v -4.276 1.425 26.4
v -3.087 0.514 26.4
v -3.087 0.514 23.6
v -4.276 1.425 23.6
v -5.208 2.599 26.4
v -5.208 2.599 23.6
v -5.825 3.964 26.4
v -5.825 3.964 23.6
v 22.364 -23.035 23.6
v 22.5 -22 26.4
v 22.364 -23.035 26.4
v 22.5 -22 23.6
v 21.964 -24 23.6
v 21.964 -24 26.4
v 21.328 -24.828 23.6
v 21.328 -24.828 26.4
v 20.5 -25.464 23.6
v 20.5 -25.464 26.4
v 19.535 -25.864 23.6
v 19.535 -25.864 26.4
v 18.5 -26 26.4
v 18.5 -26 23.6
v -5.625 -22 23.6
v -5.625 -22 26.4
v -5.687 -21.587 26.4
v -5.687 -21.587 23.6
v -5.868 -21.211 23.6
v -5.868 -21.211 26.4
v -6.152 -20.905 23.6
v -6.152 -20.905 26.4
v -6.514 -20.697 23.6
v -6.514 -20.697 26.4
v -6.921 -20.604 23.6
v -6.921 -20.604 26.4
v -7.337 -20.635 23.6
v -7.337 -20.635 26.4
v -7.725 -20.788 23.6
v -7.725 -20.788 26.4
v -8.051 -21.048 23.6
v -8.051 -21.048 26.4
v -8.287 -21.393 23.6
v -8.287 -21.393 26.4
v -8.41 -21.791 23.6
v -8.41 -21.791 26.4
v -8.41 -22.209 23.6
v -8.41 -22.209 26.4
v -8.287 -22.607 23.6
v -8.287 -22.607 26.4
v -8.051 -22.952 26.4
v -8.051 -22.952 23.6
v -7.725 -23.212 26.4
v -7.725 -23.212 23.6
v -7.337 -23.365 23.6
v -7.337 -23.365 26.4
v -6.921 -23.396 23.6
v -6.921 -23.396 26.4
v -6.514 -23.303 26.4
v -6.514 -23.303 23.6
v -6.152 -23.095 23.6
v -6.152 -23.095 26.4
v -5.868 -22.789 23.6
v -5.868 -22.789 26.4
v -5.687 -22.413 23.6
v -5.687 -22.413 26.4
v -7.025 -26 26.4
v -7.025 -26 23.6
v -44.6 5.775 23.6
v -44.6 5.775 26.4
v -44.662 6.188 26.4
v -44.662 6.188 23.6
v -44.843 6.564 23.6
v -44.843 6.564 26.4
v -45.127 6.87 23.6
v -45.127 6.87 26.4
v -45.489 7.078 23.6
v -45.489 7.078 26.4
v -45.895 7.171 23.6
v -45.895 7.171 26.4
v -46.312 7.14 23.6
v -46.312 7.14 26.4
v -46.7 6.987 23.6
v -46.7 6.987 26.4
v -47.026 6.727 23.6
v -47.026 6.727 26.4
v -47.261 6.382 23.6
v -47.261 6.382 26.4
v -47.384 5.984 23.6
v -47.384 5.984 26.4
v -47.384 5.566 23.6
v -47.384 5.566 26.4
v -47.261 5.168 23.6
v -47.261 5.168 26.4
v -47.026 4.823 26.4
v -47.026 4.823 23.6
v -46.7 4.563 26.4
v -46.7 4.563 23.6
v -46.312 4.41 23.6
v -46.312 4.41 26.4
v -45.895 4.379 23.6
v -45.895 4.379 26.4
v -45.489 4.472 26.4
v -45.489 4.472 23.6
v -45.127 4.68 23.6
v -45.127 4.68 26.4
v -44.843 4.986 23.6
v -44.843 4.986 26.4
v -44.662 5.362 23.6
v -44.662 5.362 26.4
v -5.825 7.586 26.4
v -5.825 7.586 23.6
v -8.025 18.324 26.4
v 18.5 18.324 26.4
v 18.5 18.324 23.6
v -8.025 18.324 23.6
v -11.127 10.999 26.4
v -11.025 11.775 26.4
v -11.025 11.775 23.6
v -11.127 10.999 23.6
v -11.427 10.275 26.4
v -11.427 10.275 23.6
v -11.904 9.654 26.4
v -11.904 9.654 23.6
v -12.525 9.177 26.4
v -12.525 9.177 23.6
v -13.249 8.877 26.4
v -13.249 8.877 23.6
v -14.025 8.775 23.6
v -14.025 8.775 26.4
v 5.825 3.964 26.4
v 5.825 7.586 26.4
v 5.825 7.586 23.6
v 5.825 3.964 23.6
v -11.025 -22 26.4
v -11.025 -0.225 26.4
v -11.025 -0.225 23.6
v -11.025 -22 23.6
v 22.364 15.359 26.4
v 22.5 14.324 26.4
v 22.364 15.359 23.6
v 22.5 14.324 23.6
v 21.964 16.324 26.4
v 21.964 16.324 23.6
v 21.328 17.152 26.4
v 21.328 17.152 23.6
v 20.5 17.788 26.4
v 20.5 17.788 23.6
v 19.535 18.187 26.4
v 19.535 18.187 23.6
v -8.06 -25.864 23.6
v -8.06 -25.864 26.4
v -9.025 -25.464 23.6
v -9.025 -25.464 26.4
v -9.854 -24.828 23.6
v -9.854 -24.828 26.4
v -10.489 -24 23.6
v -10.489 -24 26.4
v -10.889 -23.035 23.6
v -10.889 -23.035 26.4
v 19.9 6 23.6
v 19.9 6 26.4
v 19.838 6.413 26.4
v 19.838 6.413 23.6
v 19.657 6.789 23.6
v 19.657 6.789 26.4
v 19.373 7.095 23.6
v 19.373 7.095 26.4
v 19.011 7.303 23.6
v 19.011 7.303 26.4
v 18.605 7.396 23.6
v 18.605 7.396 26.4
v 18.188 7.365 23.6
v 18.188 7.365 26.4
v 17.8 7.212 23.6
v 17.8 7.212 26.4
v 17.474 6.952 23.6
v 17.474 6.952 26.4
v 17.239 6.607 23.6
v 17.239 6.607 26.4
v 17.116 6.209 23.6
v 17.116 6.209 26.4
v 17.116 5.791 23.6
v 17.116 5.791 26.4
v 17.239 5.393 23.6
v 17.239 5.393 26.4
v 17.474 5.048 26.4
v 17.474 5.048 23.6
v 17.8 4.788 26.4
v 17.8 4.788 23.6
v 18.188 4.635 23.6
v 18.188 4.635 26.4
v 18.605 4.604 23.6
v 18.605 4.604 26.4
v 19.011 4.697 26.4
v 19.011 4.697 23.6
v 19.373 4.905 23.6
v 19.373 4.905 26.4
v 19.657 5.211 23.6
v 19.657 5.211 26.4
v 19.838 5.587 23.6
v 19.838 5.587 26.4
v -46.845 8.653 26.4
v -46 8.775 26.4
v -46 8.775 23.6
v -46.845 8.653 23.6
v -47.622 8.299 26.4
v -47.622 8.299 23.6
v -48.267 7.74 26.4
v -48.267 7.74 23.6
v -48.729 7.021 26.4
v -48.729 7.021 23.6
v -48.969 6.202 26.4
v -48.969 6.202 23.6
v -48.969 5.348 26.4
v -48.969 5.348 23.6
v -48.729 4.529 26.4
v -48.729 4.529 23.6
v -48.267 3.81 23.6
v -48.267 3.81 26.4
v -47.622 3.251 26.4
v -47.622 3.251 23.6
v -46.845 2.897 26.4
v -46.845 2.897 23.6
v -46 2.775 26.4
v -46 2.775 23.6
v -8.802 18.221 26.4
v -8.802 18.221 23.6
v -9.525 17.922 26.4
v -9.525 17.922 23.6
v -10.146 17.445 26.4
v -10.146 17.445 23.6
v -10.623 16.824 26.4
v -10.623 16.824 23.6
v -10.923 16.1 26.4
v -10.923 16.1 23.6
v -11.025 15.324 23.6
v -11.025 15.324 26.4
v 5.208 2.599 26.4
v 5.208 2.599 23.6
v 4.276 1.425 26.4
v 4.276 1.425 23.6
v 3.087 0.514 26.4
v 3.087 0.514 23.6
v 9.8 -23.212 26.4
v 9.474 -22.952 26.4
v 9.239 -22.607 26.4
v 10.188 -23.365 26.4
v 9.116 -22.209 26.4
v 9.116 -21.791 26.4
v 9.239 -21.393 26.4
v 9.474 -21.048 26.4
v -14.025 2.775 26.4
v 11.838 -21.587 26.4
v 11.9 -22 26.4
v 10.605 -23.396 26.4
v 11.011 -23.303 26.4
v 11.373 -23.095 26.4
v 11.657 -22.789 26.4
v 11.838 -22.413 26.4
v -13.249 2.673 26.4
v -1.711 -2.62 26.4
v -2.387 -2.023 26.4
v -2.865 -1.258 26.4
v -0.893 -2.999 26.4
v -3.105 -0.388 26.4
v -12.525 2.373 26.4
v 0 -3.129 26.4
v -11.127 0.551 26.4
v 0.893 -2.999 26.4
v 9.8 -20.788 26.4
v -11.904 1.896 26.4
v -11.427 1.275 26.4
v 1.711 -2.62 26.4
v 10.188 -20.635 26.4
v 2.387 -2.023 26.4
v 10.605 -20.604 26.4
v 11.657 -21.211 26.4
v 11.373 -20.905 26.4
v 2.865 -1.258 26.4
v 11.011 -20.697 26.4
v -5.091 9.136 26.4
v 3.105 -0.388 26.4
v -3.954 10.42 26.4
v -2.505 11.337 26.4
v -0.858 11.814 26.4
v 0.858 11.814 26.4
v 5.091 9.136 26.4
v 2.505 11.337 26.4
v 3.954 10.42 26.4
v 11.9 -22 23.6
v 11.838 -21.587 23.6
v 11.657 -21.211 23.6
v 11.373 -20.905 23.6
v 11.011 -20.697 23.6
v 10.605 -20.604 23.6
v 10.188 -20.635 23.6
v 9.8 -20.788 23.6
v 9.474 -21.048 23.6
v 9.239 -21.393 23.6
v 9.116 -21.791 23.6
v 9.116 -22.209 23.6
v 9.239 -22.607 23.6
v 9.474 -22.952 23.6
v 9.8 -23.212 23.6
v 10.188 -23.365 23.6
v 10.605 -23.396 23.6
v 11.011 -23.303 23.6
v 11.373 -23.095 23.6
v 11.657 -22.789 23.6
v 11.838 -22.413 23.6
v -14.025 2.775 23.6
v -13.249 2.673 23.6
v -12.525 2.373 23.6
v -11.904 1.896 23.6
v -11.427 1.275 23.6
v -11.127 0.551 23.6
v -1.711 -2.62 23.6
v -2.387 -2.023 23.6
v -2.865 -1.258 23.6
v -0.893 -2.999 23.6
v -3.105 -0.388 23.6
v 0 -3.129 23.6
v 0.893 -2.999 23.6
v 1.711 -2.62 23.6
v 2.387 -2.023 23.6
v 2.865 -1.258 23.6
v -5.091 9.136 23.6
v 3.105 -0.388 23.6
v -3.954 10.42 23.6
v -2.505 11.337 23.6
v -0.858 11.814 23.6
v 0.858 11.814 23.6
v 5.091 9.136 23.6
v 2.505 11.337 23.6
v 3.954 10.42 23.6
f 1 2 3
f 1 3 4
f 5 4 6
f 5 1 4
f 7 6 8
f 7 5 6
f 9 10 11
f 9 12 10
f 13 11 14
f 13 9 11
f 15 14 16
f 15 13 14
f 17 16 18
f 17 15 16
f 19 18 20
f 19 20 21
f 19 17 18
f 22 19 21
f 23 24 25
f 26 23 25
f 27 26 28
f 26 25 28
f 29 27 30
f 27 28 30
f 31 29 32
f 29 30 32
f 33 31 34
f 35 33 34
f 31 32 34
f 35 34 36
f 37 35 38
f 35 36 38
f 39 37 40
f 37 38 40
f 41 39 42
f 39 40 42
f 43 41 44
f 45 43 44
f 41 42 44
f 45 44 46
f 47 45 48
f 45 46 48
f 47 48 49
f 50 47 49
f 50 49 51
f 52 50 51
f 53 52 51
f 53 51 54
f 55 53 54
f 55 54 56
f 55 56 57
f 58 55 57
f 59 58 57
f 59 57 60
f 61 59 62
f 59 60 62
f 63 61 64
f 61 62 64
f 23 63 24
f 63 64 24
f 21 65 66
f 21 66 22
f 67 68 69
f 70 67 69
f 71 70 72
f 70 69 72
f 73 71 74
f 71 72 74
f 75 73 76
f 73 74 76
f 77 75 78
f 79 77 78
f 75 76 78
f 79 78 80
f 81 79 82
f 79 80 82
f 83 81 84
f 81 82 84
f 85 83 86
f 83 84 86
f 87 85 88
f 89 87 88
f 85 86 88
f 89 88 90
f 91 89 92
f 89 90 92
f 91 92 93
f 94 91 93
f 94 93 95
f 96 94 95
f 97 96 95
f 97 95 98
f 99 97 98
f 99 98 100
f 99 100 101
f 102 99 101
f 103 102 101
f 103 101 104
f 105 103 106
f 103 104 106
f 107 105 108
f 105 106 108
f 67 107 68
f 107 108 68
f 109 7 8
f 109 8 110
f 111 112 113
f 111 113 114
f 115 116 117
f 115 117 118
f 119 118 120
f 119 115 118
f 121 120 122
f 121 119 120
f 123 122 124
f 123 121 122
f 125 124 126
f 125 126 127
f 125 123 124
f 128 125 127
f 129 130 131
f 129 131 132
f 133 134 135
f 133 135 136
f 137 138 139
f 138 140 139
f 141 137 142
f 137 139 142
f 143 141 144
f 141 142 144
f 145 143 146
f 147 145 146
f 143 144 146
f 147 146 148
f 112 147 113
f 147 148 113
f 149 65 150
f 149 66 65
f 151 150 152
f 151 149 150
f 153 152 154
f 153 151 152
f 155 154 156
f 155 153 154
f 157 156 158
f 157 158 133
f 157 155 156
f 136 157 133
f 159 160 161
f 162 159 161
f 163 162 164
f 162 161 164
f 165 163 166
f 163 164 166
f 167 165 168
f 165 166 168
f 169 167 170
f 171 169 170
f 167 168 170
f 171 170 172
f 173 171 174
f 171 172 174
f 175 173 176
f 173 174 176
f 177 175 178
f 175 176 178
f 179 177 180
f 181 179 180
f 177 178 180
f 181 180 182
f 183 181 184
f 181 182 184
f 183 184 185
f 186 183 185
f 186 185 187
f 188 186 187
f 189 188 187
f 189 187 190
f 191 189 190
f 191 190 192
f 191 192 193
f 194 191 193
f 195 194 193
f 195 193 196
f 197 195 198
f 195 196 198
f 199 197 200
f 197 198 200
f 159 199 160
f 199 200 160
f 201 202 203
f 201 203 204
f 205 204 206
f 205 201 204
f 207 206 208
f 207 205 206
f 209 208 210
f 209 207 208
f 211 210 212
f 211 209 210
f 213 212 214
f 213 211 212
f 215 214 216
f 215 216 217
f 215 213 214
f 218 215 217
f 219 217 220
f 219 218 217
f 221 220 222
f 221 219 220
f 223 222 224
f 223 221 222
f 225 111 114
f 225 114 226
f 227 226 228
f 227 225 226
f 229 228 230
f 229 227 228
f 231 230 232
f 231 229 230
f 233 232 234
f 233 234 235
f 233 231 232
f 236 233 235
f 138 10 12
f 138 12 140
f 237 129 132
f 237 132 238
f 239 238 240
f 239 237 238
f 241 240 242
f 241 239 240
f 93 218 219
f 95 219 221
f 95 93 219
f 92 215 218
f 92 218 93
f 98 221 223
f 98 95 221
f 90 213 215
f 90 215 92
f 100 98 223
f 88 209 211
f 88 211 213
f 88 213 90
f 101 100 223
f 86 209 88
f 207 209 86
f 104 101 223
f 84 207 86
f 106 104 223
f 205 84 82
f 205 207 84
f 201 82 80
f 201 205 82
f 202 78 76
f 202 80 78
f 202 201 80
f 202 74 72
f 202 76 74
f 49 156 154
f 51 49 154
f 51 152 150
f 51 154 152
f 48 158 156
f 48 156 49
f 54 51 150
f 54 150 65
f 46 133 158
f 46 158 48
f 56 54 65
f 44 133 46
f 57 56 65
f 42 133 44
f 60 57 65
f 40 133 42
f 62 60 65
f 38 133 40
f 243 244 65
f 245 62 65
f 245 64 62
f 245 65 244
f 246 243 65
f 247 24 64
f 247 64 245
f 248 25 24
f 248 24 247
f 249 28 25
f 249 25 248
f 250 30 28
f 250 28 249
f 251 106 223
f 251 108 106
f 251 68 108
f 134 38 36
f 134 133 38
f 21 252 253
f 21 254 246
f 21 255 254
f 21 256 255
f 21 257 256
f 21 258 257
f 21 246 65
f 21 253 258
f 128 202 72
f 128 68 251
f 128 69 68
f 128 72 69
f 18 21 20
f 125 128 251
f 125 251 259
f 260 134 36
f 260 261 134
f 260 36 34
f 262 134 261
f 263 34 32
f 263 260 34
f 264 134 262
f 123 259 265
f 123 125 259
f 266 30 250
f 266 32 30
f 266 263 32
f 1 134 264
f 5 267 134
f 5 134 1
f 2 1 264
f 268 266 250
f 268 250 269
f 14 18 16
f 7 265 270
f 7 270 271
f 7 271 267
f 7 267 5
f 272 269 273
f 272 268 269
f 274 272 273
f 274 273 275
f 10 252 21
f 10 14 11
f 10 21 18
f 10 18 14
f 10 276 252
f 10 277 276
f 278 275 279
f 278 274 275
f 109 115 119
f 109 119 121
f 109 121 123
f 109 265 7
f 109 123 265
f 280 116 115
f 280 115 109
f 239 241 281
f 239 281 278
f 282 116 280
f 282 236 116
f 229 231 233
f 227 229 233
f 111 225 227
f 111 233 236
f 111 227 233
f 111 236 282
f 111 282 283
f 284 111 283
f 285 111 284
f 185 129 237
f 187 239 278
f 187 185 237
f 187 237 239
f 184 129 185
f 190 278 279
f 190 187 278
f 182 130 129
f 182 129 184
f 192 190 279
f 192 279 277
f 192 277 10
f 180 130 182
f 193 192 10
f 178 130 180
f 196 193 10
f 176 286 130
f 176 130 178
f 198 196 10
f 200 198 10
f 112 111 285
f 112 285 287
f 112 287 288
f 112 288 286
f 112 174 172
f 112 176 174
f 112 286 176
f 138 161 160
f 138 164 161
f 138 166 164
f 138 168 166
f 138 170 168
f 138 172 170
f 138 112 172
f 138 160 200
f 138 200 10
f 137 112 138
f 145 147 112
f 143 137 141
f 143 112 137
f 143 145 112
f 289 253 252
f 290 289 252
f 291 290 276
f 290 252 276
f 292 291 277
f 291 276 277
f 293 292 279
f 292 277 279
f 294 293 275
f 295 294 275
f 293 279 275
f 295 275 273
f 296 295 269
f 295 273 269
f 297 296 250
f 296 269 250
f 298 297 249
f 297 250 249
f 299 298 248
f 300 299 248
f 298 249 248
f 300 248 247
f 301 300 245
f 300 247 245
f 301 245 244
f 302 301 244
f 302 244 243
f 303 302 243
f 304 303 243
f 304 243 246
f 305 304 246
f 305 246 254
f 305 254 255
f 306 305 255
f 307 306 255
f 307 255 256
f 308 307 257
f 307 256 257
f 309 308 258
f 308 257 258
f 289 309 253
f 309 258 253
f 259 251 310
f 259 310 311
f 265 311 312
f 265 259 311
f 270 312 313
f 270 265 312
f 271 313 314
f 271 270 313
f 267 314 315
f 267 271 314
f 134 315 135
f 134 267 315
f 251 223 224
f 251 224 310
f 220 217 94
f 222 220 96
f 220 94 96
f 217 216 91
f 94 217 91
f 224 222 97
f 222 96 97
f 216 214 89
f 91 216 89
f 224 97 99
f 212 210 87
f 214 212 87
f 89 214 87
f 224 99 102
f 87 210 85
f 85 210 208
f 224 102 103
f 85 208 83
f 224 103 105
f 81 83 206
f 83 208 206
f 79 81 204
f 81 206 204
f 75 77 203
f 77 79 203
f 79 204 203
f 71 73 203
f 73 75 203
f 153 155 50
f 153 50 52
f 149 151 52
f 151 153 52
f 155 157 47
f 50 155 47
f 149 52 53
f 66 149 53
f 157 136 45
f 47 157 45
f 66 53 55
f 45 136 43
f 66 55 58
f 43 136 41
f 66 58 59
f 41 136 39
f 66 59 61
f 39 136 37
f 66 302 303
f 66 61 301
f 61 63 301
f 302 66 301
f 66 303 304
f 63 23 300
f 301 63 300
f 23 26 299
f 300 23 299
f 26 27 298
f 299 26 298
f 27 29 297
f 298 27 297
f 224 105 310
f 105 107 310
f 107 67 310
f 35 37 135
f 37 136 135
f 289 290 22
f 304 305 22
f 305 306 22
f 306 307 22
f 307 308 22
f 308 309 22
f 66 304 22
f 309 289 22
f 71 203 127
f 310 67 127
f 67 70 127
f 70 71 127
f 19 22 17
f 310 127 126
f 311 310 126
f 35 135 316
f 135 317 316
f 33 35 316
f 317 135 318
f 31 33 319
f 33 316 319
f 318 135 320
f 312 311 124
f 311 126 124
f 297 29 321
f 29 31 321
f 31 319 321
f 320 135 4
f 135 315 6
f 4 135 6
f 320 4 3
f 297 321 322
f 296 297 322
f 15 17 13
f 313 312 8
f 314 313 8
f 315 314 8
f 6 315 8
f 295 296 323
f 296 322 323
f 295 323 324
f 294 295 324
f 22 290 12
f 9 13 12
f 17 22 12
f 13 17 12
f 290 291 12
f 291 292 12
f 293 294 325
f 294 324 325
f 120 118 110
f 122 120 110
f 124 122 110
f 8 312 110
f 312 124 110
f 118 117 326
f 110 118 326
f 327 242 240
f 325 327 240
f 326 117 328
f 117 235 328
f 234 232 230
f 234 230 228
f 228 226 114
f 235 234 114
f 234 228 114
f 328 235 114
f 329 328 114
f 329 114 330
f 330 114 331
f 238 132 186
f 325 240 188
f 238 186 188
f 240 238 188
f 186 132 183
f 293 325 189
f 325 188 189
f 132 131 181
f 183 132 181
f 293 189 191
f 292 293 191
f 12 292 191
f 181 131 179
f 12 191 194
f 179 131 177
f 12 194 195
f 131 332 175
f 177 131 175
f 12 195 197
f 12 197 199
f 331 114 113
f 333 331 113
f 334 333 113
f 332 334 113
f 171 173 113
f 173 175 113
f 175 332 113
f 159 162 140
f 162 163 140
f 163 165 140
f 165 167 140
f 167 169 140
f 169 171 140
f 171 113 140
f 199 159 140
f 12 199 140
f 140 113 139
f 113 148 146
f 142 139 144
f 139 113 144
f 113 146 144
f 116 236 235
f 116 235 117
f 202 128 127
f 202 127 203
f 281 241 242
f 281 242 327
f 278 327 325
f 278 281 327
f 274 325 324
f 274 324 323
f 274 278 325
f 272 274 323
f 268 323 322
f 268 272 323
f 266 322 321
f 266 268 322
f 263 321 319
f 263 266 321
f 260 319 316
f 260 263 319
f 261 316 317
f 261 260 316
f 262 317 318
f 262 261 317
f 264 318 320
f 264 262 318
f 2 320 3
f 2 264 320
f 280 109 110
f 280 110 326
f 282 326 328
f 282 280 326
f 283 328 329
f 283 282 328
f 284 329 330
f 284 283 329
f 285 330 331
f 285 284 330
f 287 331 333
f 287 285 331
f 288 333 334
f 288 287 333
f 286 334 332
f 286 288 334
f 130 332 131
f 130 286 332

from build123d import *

# Parameters (mm, degrees)
F0_W     = 11.65
F0_H     = 23.75
F1_DEPTH = 20.4
F3_DEPTH = 6
F5_START = -0.8
F4_W     = 11.65
F4_H     = 4.2
F5_DEPTH = 2
F6_R     = 0.5
F7_R     = 1
F8_R     = 1.4
F9_DEPTH = 2.8
F10_R    = 4


# Not quite as in the source:
# - a feature names something its author has since deleted; it is built from what else it names


with BuildPart() as f1:
    # F0 (on Top) → F1 (new body)
    with BuildSketch(Plane.XY):
        Rectangle(F0_W, F0_H)
    extrude(amount=F1_DEPTH)

    # F2 (on face) → F3 (join)
    with BuildSketch(Plane.XY.offset(20.4)):
        with BuildLine():
            Line((5.825, 3.9640955299), (5.825, 7.5859044701))
            ThreePointArc((5.825, 7.5859044701), (0, 11.875), (-5.825, 7.5859044701))
            Line((-5.825, 7.5859044701), (-5.825, 3.9640955299))
            ThreePointArc((-5.825, 3.9640955299), (-4.7781429098, 1.9829886164), (-3.0865775367, 0.5135326087))
            ThreePointArc((-3.0865775367, 0.5135326087), (0, -3.1), (3.0865775367, 0.5135326087))
            ThreePointArc((3.0865775367, 0.5135326087), (4.7781429098, 1.9829886164), (5.825, 3.9640955299))
        make_face()
    extrude(amount=F3_DEPTH)

    # F4 (on face) → F5 (join)
    with BuildSketch(Plane.XY.offset(20.4).offset(F5_START)):
        with Locations((0, -13.975)):
            Rectangle(F4_W, F4_H)
        with Locations((0, 13.975)):
            Rectangle(F4_W, F4_H)
    extrude(amount=-F5_DEPTH)

    # F6
    f6_edges = [f1.edges().sort_by_distance(p)[0] for p in [
        (5.825, 11.875, 8.8),
        (5.825, -11.875, 8.8),
        (-5.825, -11.875, 8.8),
        (-5.825, 11.875, 8.8),
    ]]
    fillet(f6_edges, radius=F6_R)

    # F7
    f7_edges = [f1.edges().sort_by_distance(p)[0] for p in [
        (-5.825, 16.075, 18.6),
        (5.825, 16.075, 18.6),
        (5.825, -16.075, 18.6),
        (-5.825, -16.075, 18.6),
    ]]
    fillet(f7_edges, radius=F7_R)


with BuildPart() as f9:
    # F8 (on face) → F9 (new body)
    with BuildSketch(Plane.XY.offset(26.4)):
        with BuildLine():
            Line((22.5, -26), (22.5, 18.3236394078))
            Line((22.5, 18.3236394078), (1.6129450202, 18.3236394078))
            Line((1.6129450202, 18.3236394078), (-8.0251465812, 18.3236394078))
            ThreePointArc((-8.0251465812, 18.3236394078), (-10.1464669248, 17.4449597513), (-11.0251465812, 15.3236394078))
            Line((-11.0251465812, 15.3236394078), (-11.0251465812, 11.775))
            ThreePointArc((-11.0251465812, 11.775), (-11.9038262377, 9.6536796564), (-14.0251465812, 8.775))
            Line((-14.0251465812, 8.775), (-46, 8.775))
            ThreePointArc((-46, 8.775), (-49, 5.775), (-46, 2.775))
            Line((-46, 2.775), (-14.0251465812, 2.775))
            ThreePointArc((-14.0251465812, 2.775), (-11.9038262377, 1.8963203436), (-11.0251465812, -0.225))
            Line((-11.0251465812, -0.225), (-11.0251465812, -15.0673655123))
            Line((-11.0251465812, -15.0673655123), (-11.0251465812, -26))
            Line((-11.0251465812, -26), (22.5, -26))
        make_face()
        with Locations((-7.0251465812, -22)):
            Circle(F8_R, mode=Mode.SUBTRACT)
        with Locations((10.5, -22)):
            Circle(F8_R, mode=Mode.SUBTRACT)
        with Locations((-46, 5.775)):
            Circle(F8_R, mode=Mode.SUBTRACT)
        with BuildLine():
            ThreePointArc((5.825, 3.9640955299), (4.7781429098, 1.9829886164), (3.0865775367, 0.5135326087))
            ThreePointArc((3.0865775367, 0.5135326087), (0, -3.1290056936), (-3.0865775367, 0.5135326087))
            ThreePointArc((-3.0865775367, 0.5135326087), (-4.7781429098, 1.9829886164), (-5.825, 3.9640955299))
            Line((-5.825, 3.9640955299), (-5.825, 7.5859044701))
            ThreePointArc((-5.825, 7.5859044701), (0, 11.875), (5.825, 7.5859044701))
            Line((5.825, 7.5859044701), (5.825, 3.9640955299))
        make_face(mode=Mode.SUBTRACT)
        with Locations((18.5, 6)):
            Circle(F8_R, mode=Mode.SUBTRACT)
    extrude(amount=-F9_DEPTH)

    # F10
    f10_edges = [f9.edges().sort_by_distance(p)[0] for p in [
        (-11.025147, -26, 25),
        (22.5, -26, 25),
        (22.5, 18.323639, 25),
    ]]
    fillet(f10_edges, radius=F10_R)


with BuildPart() as f11_1:
    # F11: copy of F9
    add(f9.part)


solid = f9.part
